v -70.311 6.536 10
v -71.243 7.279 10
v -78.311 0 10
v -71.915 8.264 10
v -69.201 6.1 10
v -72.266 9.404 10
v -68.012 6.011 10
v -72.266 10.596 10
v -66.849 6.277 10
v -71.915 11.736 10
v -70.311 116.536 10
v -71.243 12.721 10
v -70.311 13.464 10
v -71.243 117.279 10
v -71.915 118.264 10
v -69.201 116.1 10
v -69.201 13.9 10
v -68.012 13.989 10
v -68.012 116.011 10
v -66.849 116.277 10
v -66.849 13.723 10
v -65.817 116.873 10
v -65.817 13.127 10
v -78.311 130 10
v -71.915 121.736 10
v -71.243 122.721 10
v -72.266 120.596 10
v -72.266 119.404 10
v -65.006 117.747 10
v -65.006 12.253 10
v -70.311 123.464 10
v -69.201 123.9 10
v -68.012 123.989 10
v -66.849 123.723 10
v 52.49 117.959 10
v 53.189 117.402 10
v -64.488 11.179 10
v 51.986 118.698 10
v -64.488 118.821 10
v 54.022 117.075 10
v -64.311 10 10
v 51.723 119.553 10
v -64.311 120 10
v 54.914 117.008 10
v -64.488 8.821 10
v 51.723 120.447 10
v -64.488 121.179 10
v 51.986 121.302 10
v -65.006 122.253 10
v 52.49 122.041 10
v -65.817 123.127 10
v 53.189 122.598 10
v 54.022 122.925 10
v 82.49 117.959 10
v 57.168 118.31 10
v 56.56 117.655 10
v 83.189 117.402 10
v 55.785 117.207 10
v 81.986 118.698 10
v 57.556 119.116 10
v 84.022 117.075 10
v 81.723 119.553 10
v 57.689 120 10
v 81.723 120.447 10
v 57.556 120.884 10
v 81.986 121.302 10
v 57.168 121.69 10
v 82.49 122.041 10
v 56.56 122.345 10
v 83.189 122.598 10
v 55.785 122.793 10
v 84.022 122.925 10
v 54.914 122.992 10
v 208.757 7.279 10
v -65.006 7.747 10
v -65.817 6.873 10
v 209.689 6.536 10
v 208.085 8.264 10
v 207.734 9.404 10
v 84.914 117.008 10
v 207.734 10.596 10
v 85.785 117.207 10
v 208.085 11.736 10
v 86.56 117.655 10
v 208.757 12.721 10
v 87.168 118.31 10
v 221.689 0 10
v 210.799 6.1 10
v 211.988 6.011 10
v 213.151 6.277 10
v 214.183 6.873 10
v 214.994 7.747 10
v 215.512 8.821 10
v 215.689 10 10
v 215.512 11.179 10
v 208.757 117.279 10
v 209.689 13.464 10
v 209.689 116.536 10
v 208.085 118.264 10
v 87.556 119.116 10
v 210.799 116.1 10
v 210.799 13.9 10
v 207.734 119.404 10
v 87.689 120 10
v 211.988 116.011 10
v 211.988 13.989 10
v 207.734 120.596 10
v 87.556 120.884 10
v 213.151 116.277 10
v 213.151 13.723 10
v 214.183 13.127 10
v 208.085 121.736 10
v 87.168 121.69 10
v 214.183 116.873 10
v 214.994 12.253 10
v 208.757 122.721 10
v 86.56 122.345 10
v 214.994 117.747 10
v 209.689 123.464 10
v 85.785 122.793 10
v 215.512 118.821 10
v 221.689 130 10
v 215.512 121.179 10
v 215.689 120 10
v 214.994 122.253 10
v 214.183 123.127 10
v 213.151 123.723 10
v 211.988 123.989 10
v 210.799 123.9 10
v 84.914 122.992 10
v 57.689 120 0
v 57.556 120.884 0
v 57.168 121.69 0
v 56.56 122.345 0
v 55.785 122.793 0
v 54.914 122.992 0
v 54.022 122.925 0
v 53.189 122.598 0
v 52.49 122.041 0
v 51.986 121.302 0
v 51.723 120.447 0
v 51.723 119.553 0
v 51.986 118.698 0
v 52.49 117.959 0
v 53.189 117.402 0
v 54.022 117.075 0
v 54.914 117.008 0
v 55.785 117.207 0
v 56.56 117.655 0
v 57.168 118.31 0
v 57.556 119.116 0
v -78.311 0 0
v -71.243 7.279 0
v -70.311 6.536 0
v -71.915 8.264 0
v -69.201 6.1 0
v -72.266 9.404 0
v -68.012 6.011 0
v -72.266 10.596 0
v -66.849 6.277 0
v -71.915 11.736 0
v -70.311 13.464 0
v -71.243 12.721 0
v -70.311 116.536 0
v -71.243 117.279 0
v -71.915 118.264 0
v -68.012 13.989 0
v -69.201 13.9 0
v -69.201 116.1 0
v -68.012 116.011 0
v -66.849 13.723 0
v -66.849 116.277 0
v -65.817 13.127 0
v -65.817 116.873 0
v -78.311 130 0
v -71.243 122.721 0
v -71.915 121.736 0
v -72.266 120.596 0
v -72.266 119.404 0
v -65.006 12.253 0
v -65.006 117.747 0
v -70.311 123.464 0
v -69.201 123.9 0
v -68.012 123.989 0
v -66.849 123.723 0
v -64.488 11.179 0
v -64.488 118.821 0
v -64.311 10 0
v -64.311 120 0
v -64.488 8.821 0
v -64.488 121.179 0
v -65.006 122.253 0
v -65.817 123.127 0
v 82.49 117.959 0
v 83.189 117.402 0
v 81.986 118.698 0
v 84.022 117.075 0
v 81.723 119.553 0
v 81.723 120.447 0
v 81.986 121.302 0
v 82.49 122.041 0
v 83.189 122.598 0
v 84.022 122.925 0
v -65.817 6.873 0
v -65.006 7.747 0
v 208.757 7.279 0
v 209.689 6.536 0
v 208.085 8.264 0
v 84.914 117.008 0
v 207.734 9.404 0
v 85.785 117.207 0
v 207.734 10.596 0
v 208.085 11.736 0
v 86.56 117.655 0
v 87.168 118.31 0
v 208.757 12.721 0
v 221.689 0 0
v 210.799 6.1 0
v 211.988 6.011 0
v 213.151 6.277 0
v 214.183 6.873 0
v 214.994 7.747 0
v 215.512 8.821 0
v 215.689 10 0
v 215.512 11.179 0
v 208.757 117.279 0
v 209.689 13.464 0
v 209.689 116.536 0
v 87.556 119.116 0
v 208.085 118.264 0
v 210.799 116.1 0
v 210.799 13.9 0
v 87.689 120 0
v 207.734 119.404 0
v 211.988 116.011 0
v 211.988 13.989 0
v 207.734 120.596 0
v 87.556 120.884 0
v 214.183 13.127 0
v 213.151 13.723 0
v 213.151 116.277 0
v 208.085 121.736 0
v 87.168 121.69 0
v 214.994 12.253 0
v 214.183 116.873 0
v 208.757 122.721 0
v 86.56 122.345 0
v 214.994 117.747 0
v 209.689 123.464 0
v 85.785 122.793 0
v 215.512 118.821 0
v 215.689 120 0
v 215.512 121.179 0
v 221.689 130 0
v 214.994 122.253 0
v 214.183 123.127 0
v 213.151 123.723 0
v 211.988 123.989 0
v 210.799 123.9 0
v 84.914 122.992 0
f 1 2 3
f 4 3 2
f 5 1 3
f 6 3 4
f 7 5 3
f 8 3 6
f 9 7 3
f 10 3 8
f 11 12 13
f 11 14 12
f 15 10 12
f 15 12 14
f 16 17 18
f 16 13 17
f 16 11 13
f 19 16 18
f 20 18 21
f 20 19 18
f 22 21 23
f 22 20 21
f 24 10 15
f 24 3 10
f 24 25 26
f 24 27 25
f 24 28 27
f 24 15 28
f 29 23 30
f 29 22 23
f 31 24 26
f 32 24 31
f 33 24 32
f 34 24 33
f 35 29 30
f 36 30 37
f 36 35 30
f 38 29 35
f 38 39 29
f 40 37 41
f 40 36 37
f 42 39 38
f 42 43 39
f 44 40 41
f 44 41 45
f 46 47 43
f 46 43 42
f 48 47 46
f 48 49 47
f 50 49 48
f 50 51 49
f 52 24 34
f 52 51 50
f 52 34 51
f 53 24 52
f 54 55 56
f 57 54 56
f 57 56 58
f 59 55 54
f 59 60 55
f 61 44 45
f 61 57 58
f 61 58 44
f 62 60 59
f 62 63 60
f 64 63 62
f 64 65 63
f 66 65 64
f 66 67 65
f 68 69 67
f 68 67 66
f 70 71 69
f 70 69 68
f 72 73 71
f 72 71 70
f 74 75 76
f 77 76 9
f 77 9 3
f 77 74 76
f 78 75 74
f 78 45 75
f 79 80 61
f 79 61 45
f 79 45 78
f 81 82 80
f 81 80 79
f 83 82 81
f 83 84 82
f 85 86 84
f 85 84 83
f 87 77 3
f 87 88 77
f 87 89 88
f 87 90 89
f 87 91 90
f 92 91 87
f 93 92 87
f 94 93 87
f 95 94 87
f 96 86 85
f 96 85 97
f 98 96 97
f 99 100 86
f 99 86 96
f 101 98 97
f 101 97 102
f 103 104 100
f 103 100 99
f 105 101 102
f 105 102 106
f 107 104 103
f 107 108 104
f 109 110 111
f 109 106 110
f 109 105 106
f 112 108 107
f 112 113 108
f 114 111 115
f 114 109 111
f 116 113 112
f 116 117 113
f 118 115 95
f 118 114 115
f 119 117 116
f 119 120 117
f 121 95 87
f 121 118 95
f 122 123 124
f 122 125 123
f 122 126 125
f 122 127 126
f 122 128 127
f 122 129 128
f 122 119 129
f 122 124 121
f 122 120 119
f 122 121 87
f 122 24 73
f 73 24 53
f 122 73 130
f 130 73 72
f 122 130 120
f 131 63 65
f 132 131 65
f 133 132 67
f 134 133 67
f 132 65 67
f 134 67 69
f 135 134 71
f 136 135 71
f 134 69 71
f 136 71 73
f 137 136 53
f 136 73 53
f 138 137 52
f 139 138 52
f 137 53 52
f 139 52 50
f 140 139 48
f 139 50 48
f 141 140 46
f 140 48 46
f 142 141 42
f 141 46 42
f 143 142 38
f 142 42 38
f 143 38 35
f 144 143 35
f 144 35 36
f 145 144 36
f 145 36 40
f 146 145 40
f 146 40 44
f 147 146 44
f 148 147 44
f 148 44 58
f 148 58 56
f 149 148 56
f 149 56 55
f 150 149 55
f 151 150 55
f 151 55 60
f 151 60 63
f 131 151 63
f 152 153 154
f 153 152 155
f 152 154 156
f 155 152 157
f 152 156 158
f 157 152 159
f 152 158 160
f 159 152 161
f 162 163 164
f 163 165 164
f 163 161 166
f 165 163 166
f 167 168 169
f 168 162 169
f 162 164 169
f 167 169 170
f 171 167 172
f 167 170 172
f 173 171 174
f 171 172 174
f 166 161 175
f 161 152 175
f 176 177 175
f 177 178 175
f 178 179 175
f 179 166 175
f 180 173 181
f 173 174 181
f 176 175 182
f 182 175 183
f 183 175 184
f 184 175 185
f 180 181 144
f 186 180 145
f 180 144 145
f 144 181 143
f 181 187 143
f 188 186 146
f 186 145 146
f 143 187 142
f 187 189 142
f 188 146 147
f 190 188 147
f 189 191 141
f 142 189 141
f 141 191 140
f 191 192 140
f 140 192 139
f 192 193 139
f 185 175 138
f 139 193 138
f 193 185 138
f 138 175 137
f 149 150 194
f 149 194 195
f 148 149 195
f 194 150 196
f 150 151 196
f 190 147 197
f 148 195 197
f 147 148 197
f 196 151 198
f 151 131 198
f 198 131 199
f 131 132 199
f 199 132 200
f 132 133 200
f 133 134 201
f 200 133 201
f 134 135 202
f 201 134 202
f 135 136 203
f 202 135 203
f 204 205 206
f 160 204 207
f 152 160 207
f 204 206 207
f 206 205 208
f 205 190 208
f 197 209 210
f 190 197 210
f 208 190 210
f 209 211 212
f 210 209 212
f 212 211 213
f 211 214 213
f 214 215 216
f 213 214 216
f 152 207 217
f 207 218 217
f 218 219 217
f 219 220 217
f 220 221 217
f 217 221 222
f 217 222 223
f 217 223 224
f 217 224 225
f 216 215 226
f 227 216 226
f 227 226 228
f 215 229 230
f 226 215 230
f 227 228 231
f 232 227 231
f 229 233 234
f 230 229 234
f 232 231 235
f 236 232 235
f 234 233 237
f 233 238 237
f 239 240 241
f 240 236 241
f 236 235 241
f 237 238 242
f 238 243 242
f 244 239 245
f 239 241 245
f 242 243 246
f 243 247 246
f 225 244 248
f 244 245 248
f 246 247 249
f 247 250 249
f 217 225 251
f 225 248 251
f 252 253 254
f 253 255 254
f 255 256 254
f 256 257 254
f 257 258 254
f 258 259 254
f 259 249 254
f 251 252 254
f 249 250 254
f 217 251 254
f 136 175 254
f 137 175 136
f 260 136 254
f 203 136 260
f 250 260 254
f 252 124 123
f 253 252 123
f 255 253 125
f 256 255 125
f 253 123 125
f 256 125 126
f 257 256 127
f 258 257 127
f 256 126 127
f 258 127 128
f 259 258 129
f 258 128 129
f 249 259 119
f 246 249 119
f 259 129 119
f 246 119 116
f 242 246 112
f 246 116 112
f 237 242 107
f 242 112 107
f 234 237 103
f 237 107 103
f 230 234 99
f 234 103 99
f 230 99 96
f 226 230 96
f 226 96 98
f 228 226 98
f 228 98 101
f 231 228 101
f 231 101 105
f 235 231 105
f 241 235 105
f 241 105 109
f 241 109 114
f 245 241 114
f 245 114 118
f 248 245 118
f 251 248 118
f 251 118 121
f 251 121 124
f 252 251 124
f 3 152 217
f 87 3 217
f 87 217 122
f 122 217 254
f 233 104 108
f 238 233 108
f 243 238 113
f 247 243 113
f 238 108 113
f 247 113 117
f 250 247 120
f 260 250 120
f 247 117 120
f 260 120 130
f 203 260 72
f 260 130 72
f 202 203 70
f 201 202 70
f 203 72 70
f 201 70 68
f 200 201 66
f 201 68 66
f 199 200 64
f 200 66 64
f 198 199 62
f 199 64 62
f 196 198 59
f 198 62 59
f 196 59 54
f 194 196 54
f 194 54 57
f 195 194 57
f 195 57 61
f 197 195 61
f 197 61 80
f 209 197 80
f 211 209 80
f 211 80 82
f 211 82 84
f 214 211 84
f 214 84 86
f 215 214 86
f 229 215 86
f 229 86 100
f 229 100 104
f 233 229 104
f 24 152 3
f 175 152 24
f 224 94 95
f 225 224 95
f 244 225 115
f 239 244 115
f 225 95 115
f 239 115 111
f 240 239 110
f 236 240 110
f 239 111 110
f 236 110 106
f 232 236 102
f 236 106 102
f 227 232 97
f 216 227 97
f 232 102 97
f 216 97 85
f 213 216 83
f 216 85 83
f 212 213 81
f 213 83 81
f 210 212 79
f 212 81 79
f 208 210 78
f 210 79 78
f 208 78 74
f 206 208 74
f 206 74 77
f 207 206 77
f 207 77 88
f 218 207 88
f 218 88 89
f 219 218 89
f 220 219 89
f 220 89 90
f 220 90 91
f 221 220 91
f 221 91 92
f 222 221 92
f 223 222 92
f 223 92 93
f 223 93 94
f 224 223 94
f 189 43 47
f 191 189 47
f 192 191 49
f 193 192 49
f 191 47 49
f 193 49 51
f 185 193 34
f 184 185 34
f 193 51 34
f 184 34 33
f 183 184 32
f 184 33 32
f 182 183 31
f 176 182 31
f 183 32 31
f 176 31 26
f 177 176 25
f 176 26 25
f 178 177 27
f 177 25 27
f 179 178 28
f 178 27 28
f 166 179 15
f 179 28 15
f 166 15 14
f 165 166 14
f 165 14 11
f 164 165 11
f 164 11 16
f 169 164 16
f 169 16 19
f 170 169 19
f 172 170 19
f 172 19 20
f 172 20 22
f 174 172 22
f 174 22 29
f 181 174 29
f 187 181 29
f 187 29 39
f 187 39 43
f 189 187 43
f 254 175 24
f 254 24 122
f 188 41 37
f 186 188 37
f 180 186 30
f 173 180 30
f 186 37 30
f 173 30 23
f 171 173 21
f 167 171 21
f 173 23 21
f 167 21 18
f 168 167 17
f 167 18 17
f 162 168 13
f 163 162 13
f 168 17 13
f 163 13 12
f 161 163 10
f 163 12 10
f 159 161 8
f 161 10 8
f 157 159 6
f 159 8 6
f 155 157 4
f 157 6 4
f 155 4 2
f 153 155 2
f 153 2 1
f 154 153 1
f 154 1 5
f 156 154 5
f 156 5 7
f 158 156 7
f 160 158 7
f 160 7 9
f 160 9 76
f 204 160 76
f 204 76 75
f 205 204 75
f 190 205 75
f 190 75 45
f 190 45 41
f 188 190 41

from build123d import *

# Parameters (mm, degrees)
ESQUISSE1_W             = 300
ESQUISSE1_H             = 130
BOSS_EXTRU_1_DEPTH      = 10
ESQUISSE2_R             = 4
ENL_V_MAT_EXTRU_1_DEPTH = 258.188939373
ESQUISSE3_R             = 3
ENL_V_MAT_EXTRU_2_DEPTH = 258.188939373


with BuildPart() as part:
    # Esquisse1 → Boss.-Extru.1 (new body)
    with BuildSketch(Plane.XY):
        with Locations((71.689310829, 65)):
            Rectangle(ESQUISSE1_W, ESQUISSE1_H)
    extrude(amount=BOSS_EXTRU_1_DEPTH)

    # Esquisse2 → Enlèv. mat.-Extru.1 (cut, through all)
    with BuildSketch(Plane.XY.offset(10)):
        with Locations((-68.310689171, 120)):
            Circle(ESQUISSE2_R)
        with Locations((-68.310689171, 10)):
            Circle(ESQUISSE2_R)
        with Locations((211.689310829, 10)):
            Circle(ESQUISSE2_R)
        with Locations((211.689310829, 120)):
            Circle(ESQUISSE2_R)
    extrude(amount=-ENL_V_MAT_EXTRU_1_DEPTH, mode=Mode.SUBTRACT)

    # Esquisse3 → Enlèv. mat.-Extru.2 (cut, through all)
    with BuildSketch(Plane.XY.offset(10)):
        with Locations((84.689310829, 120)):
            Circle(ESQUISSE3_R)
        with Locations((54.689310829, 120)):
            Circle(ESQUISSE3_R)
    extrude(amount=-ENL_V_MAT_EXTRU_2_DEPTH, mode=Mode.SUBTRACT)


solid = part.part
